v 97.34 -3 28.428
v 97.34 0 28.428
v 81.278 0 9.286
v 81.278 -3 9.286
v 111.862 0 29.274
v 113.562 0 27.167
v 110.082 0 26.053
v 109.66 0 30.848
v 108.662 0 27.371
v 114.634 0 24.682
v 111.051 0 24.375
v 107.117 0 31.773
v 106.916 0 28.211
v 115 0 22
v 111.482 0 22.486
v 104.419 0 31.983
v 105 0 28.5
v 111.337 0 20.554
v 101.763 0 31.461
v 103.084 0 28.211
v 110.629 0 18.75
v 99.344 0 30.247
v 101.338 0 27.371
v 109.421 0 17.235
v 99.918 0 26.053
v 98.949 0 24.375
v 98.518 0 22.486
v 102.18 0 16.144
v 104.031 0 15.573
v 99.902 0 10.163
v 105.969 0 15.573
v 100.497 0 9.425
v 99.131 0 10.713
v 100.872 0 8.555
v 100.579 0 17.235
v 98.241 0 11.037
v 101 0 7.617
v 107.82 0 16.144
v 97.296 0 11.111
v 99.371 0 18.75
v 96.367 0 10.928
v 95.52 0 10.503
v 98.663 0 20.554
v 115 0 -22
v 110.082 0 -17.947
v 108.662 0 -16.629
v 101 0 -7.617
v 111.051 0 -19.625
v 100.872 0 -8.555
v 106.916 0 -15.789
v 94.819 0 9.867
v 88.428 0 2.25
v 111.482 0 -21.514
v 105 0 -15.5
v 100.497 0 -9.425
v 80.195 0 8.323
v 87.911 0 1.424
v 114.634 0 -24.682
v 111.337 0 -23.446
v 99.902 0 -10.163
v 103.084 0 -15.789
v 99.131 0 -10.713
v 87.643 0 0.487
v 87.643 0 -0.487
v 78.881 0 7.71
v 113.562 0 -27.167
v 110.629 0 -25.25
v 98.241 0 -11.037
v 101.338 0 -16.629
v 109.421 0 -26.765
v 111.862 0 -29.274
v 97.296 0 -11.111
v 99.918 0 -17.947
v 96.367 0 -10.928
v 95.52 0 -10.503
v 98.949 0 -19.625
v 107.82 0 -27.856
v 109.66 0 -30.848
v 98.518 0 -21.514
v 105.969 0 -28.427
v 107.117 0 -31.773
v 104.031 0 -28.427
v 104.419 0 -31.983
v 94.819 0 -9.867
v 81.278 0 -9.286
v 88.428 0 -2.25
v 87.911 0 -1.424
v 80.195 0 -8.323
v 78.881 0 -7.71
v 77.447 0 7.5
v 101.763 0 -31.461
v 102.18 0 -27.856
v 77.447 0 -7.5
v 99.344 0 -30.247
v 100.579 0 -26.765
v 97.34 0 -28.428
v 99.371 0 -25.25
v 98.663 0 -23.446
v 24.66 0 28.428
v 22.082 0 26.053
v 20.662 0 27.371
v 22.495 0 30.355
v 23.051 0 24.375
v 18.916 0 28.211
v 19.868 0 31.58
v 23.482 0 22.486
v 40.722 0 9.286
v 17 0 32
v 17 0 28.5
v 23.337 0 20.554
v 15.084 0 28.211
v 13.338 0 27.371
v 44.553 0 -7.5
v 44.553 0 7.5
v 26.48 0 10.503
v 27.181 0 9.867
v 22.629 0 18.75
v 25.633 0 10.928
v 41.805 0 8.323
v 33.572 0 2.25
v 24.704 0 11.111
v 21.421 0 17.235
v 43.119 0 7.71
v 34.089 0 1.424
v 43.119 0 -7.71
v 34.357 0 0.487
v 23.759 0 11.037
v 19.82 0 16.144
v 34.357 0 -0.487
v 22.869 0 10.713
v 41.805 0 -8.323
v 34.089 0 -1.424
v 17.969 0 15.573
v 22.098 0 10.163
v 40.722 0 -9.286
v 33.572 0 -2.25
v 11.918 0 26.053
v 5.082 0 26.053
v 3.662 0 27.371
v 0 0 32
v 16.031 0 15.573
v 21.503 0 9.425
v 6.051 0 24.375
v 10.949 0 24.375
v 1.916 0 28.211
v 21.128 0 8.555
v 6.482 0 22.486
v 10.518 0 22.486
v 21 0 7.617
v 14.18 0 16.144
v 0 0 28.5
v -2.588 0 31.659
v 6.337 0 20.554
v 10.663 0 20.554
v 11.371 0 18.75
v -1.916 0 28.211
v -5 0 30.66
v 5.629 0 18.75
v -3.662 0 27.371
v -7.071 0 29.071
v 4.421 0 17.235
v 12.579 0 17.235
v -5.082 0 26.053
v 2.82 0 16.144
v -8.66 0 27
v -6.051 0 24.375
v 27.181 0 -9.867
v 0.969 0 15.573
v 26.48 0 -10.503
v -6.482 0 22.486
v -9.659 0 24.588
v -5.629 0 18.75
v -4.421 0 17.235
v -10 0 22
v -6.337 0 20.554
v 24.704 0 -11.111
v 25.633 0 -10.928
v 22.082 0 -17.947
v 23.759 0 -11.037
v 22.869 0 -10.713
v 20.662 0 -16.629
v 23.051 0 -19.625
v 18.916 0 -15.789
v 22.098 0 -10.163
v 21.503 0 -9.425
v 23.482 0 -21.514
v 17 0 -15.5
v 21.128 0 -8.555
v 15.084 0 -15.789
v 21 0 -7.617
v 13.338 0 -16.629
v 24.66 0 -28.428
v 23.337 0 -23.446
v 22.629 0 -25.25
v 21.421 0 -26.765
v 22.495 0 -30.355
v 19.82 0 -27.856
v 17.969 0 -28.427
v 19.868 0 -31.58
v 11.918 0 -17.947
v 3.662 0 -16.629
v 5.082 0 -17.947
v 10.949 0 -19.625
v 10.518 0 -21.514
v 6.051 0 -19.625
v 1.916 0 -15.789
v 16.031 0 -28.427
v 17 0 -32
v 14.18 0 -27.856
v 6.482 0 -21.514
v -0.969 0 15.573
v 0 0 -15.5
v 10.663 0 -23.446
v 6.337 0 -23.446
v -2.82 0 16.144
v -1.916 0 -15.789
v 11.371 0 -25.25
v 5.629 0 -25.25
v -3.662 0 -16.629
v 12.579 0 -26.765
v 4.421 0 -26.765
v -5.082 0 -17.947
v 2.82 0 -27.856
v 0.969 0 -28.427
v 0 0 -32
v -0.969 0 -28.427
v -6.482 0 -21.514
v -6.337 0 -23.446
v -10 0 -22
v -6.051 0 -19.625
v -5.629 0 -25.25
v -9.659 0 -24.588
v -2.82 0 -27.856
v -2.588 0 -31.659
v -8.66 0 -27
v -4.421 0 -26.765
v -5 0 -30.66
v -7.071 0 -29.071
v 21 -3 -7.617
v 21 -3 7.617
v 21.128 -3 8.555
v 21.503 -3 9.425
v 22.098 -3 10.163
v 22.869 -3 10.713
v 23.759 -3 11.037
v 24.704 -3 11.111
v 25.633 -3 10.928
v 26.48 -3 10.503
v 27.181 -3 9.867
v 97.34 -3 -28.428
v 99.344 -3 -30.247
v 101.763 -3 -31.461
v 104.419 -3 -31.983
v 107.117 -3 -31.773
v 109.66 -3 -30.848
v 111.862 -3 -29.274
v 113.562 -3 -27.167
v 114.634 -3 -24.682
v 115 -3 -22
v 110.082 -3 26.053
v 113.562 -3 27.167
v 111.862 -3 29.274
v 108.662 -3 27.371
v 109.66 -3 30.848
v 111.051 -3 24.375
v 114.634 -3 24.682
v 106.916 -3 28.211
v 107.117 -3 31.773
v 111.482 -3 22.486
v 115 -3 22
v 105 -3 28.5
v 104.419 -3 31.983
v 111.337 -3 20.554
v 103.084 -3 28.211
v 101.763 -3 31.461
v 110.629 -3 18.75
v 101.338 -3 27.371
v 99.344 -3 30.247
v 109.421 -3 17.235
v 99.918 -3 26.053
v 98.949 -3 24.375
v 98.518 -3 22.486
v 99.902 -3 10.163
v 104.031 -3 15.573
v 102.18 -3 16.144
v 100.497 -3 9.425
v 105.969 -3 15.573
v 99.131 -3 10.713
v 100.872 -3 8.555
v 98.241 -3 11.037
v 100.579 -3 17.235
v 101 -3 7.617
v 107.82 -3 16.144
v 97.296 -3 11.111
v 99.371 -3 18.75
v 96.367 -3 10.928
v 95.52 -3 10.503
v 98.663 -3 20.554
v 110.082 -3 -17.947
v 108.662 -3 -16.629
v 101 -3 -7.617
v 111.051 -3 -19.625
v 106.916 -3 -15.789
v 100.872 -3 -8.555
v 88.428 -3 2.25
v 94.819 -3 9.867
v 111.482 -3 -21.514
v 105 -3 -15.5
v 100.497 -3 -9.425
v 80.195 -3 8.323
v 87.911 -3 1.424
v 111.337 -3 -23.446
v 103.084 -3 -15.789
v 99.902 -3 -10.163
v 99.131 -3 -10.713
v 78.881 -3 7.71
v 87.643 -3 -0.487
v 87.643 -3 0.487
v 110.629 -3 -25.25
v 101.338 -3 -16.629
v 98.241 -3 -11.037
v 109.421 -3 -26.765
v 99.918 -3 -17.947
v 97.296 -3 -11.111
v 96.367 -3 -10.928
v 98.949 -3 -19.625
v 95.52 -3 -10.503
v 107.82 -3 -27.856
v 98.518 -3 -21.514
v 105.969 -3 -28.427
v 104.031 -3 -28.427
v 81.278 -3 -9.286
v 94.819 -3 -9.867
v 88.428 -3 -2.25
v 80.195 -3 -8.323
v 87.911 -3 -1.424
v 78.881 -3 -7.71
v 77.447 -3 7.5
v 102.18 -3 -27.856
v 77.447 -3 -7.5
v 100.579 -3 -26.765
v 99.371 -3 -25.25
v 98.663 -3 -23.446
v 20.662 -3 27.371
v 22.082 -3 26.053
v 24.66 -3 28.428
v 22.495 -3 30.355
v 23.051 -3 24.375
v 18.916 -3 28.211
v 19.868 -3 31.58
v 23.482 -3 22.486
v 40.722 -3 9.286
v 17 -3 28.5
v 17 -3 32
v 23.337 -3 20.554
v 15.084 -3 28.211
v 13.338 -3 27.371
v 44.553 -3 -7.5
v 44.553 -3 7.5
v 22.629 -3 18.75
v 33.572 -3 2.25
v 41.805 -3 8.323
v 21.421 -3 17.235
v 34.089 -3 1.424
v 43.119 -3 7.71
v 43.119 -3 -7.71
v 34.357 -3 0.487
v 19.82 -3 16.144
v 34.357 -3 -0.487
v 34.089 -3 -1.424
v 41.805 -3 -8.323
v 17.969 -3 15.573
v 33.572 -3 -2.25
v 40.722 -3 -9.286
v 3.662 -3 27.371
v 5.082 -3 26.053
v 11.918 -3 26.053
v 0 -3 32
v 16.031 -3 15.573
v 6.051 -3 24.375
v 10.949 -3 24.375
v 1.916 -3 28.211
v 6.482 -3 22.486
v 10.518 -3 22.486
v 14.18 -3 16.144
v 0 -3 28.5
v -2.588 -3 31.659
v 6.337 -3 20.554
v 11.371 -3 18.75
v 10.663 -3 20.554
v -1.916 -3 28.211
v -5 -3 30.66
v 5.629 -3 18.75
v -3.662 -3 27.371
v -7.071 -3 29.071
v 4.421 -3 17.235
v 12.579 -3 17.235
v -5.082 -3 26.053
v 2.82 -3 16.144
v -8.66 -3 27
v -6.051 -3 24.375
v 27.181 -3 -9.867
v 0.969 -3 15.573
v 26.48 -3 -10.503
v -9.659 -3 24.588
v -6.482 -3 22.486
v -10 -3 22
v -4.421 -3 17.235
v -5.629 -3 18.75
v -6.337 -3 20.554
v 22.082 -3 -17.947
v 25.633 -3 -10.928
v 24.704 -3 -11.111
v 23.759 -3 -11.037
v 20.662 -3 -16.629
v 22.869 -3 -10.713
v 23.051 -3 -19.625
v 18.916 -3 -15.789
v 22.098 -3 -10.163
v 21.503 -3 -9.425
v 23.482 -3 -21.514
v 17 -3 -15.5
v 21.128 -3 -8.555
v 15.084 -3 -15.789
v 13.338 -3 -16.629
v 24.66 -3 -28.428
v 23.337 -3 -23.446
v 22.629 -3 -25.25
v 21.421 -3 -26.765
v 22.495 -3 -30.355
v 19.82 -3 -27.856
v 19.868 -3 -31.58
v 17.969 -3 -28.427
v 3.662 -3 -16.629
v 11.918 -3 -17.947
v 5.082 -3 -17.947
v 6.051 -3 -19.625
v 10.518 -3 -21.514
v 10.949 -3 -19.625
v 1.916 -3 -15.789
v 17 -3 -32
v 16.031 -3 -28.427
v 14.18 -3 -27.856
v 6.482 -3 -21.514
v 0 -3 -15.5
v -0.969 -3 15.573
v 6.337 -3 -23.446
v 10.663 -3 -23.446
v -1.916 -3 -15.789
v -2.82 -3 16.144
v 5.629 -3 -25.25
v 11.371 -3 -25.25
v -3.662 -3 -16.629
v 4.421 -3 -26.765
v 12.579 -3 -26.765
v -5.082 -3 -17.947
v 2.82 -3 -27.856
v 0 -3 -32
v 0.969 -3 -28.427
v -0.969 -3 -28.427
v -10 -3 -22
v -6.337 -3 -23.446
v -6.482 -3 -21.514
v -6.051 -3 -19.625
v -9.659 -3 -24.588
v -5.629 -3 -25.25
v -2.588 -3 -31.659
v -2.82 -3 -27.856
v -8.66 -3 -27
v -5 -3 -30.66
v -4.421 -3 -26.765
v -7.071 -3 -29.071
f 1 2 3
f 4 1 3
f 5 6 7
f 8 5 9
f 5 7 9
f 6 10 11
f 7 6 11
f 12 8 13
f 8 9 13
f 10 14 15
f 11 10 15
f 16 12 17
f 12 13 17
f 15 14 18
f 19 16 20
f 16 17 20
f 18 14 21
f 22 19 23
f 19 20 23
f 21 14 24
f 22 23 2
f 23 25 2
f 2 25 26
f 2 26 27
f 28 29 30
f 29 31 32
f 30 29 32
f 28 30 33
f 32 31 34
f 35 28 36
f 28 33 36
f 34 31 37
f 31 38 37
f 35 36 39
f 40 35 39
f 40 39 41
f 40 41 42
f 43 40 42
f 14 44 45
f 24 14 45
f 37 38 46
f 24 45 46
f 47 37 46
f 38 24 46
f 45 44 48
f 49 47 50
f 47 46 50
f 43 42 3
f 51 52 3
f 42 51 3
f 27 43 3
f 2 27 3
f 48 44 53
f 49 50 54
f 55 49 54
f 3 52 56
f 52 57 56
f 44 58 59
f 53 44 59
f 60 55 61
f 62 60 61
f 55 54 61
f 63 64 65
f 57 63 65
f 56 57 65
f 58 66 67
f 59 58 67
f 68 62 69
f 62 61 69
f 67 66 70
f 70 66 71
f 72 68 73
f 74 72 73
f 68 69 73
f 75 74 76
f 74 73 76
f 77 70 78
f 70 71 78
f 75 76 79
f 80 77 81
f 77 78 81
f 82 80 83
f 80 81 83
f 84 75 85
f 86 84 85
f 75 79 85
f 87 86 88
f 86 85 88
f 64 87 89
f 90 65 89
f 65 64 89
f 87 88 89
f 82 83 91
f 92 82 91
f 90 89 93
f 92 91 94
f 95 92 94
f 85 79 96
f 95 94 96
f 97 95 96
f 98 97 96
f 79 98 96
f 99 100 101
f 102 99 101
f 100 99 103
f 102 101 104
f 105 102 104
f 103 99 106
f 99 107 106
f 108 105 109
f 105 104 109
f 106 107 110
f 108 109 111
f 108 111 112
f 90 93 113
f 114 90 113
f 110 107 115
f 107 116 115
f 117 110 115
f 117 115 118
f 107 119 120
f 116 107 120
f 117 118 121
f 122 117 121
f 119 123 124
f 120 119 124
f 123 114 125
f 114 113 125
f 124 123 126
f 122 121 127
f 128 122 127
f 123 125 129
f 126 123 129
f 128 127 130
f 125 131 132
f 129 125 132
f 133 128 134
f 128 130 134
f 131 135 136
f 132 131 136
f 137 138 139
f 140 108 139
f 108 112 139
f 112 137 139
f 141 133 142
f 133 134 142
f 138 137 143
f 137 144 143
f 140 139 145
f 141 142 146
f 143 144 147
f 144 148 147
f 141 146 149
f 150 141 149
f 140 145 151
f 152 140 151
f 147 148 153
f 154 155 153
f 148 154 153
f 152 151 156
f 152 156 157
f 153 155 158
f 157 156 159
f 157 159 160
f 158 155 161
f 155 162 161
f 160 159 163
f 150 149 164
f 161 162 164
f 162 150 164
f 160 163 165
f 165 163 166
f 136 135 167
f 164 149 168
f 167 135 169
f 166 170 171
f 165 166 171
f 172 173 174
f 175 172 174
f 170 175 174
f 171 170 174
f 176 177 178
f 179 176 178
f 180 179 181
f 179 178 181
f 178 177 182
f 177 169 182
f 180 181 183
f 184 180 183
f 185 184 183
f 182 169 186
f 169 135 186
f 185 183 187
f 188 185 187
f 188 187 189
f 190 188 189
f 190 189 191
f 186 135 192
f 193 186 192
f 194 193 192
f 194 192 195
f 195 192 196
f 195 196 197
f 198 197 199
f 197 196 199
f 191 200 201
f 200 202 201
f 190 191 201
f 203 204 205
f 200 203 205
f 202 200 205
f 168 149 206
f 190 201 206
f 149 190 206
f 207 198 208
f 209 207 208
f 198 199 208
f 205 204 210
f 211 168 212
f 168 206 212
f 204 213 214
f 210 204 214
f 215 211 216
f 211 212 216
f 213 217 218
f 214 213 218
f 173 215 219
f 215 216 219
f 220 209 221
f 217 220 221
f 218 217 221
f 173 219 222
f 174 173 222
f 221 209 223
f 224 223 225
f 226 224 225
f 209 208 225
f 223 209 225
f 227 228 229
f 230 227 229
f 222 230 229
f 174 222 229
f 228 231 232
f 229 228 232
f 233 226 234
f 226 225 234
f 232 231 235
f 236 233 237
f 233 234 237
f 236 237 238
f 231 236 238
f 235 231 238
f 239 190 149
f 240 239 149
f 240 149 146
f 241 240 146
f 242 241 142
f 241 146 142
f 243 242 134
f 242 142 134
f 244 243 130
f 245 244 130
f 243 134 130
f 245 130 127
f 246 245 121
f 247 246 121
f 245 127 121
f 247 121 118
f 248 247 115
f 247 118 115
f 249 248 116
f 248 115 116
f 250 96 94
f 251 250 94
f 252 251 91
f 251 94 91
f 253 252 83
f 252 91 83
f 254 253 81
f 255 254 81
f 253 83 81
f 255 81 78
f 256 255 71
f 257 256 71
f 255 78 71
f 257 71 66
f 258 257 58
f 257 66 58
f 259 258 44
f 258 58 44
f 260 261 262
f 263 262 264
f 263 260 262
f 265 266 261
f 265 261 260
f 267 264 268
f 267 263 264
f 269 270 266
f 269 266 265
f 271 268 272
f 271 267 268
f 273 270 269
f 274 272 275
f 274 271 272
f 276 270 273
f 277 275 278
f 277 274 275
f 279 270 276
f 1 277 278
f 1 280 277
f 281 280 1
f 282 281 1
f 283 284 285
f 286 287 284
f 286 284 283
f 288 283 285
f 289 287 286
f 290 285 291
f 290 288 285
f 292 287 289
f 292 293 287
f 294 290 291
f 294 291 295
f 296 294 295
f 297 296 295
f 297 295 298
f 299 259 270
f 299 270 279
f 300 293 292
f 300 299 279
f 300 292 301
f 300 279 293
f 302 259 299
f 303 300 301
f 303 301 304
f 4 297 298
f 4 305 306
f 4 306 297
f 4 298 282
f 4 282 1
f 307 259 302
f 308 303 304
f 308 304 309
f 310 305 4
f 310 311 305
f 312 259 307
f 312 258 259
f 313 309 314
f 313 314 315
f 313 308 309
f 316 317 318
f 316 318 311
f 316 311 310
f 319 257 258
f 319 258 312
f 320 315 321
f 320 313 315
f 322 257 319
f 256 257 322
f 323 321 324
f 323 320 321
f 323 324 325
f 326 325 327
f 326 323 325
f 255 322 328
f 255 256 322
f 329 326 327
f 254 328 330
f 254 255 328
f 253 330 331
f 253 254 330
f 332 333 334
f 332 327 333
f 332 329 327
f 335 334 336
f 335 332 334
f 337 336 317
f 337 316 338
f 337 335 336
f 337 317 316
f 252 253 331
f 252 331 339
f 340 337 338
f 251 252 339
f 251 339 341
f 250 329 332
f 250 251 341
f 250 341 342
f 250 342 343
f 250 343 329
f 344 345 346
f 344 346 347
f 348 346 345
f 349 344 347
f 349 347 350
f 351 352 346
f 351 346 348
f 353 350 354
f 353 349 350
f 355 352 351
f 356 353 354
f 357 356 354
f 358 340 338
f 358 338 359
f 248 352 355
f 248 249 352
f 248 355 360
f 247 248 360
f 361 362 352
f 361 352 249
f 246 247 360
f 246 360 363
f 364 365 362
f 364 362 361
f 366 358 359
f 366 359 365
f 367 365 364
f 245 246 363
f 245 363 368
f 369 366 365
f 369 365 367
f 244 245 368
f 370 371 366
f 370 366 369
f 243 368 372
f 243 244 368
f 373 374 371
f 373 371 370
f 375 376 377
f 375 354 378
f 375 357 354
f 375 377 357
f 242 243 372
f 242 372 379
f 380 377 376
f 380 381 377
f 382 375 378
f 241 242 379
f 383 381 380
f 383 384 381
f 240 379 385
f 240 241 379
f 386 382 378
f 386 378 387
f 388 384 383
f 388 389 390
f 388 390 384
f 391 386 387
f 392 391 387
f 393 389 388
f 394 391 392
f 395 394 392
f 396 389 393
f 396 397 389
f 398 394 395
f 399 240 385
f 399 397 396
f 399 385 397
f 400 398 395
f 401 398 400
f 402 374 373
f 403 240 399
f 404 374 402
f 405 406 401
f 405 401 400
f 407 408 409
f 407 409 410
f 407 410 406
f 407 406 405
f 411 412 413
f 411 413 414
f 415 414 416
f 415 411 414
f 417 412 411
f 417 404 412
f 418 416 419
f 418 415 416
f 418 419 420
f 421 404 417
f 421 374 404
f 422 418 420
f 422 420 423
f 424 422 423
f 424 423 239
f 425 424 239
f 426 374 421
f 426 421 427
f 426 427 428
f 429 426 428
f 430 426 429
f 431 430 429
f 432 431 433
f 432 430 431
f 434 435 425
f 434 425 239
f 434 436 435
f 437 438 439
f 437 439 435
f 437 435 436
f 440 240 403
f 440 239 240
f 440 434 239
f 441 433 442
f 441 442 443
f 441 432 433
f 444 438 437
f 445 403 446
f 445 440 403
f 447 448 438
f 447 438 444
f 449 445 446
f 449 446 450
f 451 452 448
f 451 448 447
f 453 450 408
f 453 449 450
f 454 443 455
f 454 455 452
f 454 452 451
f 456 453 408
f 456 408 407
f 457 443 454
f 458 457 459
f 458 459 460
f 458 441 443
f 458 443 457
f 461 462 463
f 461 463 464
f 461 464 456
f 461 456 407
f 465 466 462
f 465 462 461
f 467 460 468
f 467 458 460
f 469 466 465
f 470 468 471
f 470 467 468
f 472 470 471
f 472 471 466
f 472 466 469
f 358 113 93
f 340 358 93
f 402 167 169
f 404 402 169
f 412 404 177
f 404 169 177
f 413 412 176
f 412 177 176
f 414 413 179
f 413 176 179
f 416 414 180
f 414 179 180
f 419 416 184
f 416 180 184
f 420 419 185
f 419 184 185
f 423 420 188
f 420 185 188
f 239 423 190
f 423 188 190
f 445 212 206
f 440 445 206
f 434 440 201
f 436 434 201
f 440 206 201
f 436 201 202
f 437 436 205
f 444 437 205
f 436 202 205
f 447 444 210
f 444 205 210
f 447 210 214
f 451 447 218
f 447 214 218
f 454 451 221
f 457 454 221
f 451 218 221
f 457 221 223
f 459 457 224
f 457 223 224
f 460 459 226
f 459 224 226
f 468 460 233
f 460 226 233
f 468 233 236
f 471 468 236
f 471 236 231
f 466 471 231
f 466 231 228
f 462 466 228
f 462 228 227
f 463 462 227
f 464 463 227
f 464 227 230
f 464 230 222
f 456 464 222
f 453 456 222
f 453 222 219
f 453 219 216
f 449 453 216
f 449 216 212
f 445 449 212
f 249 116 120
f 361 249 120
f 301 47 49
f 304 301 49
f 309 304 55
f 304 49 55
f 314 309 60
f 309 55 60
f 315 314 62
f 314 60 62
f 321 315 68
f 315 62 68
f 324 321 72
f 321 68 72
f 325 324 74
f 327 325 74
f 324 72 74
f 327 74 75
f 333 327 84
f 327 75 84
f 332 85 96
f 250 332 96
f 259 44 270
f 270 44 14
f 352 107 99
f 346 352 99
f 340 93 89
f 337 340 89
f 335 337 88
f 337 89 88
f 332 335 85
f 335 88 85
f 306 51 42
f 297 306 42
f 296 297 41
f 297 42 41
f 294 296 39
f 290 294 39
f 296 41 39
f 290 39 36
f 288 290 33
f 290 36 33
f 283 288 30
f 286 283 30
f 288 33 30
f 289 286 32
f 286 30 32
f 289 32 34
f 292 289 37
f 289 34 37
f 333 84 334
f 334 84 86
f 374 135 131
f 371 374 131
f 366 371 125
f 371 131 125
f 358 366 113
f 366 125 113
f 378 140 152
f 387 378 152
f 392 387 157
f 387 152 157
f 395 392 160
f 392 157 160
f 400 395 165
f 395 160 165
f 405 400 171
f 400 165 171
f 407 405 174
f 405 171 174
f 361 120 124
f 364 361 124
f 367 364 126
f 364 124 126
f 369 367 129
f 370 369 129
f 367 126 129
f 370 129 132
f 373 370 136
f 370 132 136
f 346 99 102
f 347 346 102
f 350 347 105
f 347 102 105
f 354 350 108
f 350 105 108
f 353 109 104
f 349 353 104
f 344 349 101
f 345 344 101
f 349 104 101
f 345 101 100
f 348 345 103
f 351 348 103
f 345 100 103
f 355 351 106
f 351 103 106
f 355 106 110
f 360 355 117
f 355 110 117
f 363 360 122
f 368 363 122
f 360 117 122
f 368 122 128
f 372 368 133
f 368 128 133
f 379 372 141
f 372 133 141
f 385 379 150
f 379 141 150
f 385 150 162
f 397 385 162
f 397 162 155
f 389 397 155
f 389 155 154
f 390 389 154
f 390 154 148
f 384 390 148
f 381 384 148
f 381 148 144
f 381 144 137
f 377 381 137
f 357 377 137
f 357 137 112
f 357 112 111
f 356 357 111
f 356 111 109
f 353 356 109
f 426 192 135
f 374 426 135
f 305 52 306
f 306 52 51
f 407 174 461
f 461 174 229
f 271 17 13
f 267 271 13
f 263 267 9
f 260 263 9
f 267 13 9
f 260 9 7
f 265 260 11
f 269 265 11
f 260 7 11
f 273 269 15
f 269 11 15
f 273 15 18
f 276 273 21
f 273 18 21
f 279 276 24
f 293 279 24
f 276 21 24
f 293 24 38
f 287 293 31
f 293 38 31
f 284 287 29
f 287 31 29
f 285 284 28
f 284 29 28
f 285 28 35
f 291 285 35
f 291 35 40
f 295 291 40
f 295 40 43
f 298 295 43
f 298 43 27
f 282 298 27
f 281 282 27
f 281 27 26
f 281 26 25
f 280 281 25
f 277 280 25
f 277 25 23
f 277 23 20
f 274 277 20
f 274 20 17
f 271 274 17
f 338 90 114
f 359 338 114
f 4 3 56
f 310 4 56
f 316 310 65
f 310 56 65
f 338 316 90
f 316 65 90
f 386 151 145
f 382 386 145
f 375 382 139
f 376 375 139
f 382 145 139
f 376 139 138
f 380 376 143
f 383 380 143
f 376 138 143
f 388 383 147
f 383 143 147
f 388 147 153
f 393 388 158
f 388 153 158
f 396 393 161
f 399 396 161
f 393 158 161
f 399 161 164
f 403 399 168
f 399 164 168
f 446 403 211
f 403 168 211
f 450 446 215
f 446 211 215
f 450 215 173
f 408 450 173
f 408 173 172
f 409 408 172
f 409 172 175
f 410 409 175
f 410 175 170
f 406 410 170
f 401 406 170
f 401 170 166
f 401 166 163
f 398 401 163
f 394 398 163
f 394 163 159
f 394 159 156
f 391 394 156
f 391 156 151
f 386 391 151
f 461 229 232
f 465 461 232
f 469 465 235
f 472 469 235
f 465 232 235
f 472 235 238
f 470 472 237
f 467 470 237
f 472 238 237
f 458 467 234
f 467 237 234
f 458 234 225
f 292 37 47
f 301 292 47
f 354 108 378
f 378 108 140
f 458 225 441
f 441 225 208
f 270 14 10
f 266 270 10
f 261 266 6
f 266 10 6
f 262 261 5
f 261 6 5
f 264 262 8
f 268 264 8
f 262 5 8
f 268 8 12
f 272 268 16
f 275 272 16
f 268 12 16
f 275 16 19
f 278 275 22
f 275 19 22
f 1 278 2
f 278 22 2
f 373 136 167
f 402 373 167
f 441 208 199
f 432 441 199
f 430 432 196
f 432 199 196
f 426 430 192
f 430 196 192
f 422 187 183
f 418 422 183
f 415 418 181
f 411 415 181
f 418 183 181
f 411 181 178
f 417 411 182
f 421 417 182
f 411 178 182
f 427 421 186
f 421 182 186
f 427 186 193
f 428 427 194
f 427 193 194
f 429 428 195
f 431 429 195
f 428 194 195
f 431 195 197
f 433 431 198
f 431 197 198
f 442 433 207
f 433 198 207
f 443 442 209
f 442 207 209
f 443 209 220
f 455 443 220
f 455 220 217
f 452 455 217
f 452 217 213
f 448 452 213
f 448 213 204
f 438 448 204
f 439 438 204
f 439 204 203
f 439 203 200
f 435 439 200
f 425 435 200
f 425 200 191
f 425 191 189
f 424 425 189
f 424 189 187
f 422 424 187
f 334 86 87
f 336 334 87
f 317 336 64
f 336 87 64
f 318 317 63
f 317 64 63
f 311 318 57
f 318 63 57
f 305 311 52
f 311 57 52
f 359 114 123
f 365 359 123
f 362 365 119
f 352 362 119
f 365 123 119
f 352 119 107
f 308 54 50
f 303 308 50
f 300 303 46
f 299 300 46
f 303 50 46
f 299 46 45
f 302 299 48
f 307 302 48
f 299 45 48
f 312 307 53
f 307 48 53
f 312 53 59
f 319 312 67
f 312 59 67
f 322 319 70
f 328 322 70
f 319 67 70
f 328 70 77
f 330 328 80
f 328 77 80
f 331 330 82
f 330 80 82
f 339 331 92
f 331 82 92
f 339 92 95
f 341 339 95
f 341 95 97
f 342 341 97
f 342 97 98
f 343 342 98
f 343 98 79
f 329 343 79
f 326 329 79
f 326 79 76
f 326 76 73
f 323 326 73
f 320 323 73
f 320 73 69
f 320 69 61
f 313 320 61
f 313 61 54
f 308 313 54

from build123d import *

# Parameters (mm, degrees)
BASE_DEPTH    = 3
SKETCH2_R     = 6.5
HOLES_DEPTH   = 120.406867474
CUTAWAY_DEPTH = 120.406867474


with BuildPart() as part:
    # Sketch1 → base (new body)
    with BuildSketch(Plane(origin=(0, 0, 0), x_dir=(1, 0, 0), z_dir=(0, 1, 0))):
        with BuildLine():
            Line((-10, -22), (-10, 22))
            ThreePointArc((-10, 22), (-7.071067812, 29.071067812), (0, 32))
            Line((0, 32), (17, 32))
            ThreePointArc((17, 32), (21.226182617, 31.06307787), (24.660444431, 28.427876097))
            Line((24.660444431, 28.427876097), (40.722333621, 9.286061952))
            ThreePointArc((40.722333621, 9.286061952), (42.439464527, 7.968461065), (44.552555836, 7.5))
            Line((44.552555836, 7.5), (77.447444164, 7.5))
            ThreePointArc((77.447444164, 7.5), (79.560535473, 7.968461065), (81.277666379, 9.286061952))
            Line((81.277666379, 9.286061952), (97.339555569, 28.427876097))
            ThreePointArc((97.339555569, 28.427876097), (108.420201433, 31.396926208), (115, 22))
            Line((115, 22), (115, -22))
            ThreePointArc((115, -22), (108.420201433, -31.396926208), (97.339555569, -28.427876097))
            Line((97.339555569, -28.427876097), (81.277666379, -9.286061952))
            ThreePointArc((81.277666379, -9.286061952), (79.560535473, -7.968461065), (77.447444164, -7.5))
            Line((77.447444164, -7.5), (44.552555836, -7.5))
            ThreePointArc((44.552555836, -7.5), (42.439464527, -7.968461065), (40.722333621, -9.286061952))
            Line((40.722333621, -9.286061952), (24.660444431, -28.427876097))
            ThreePointArc((24.660444431, -28.427876097), (21.226182617, -31.06307787), (17, -32))
            Line((17, -32), (0, -32))
            ThreePointArc((0, -32), (-7.071067812, -29.071067812), (-10, -22))
        make_face()
    extrude(amount=-BASE_DEPTH)

    # Sketch2 → holes (cut, through all)
    with BuildSketch(Plane(origin=(0, 0, 0), x_dir=(1, 0, 0), z_dir=(0, 1, 0))):
        with Locations(Location((0, 22, 0), (0, 0, 270))):
            Circle(SKETCH2_R)
        with Locations(Location((17, 22, 0), (0, 0, 270))):
            Circle(SKETCH2_R)
        with Locations(Location((105, 22, 0), (0, 0, 270))):
            Circle(SKETCH2_R)
        with Locations(Location((105, -22, 0), (0, 0, 270))):
            Circle(SKETCH2_R)
        with Locations(Location((17, -22, 0), (0, 0, 270))):
            Circle(SKETCH2_R)
        with Locations(Location((0, -22, 0), (0, 0, 270))):
            Circle(SKETCH2_R)
    extrude(amount=-HOLES_DEPTH, mode=Mode.SUBTRACT)

    # Sketch3 → cutaway (cut, through all)
    with BuildSketch(Plane(origin=(0, 0, 0), x_dir=(-1, 0, 0), z_dir=(0, 1, 0))):
        with BuildLine():
            Line((-21, -7.616814662), (-21, 7.616814662))
            ThreePointArc((-21, 7.616814662), (-23.302929498, 10.905738834), (-27.181155551, 9.866571295))
            Line((-27.181155551, 9.866571295), (-33.572421924, 2.249756634))
            ThreePointArc((-33.572421924, 2.249756634), (-34.391266373, 0), (-33.572421924, -2.249756634))
            Line((-33.572421924, -2.249756634), (-27.181155551, -9.866571295))
            ThreePointArc((-27.181155551, -9.866571295), (-23.302929498, -10.905738834), (-21, -7.616814662))
        make_face()
        with BuildLine():
            Line((-94.818844449, -9.866571295), (-88.427578076, -2.249756634))
            ThreePointArc((-88.427578076, -2.249756634), (-87.608733627, 0), (-88.427578076, 2.249756634))
            Line((-88.427578076, 2.249756634), (-94.818844449, 9.866571295))
            ThreePointArc((-94.818844449, 9.866571295), (-98.697070502, 10.905738834), (-101, 7.616814662))
            Line((-101, 7.616814662), (-101, -7.616814662))
            ThreePointArc((-101, -7.616814662), (-98.697070502, -10.905738834), (-94.818844449, -9.866571295))
        make_face()
    extrude(amount=-CUTAWAY_DEPTH, mode=Mode.SUBTRACT)


solid = part.part
